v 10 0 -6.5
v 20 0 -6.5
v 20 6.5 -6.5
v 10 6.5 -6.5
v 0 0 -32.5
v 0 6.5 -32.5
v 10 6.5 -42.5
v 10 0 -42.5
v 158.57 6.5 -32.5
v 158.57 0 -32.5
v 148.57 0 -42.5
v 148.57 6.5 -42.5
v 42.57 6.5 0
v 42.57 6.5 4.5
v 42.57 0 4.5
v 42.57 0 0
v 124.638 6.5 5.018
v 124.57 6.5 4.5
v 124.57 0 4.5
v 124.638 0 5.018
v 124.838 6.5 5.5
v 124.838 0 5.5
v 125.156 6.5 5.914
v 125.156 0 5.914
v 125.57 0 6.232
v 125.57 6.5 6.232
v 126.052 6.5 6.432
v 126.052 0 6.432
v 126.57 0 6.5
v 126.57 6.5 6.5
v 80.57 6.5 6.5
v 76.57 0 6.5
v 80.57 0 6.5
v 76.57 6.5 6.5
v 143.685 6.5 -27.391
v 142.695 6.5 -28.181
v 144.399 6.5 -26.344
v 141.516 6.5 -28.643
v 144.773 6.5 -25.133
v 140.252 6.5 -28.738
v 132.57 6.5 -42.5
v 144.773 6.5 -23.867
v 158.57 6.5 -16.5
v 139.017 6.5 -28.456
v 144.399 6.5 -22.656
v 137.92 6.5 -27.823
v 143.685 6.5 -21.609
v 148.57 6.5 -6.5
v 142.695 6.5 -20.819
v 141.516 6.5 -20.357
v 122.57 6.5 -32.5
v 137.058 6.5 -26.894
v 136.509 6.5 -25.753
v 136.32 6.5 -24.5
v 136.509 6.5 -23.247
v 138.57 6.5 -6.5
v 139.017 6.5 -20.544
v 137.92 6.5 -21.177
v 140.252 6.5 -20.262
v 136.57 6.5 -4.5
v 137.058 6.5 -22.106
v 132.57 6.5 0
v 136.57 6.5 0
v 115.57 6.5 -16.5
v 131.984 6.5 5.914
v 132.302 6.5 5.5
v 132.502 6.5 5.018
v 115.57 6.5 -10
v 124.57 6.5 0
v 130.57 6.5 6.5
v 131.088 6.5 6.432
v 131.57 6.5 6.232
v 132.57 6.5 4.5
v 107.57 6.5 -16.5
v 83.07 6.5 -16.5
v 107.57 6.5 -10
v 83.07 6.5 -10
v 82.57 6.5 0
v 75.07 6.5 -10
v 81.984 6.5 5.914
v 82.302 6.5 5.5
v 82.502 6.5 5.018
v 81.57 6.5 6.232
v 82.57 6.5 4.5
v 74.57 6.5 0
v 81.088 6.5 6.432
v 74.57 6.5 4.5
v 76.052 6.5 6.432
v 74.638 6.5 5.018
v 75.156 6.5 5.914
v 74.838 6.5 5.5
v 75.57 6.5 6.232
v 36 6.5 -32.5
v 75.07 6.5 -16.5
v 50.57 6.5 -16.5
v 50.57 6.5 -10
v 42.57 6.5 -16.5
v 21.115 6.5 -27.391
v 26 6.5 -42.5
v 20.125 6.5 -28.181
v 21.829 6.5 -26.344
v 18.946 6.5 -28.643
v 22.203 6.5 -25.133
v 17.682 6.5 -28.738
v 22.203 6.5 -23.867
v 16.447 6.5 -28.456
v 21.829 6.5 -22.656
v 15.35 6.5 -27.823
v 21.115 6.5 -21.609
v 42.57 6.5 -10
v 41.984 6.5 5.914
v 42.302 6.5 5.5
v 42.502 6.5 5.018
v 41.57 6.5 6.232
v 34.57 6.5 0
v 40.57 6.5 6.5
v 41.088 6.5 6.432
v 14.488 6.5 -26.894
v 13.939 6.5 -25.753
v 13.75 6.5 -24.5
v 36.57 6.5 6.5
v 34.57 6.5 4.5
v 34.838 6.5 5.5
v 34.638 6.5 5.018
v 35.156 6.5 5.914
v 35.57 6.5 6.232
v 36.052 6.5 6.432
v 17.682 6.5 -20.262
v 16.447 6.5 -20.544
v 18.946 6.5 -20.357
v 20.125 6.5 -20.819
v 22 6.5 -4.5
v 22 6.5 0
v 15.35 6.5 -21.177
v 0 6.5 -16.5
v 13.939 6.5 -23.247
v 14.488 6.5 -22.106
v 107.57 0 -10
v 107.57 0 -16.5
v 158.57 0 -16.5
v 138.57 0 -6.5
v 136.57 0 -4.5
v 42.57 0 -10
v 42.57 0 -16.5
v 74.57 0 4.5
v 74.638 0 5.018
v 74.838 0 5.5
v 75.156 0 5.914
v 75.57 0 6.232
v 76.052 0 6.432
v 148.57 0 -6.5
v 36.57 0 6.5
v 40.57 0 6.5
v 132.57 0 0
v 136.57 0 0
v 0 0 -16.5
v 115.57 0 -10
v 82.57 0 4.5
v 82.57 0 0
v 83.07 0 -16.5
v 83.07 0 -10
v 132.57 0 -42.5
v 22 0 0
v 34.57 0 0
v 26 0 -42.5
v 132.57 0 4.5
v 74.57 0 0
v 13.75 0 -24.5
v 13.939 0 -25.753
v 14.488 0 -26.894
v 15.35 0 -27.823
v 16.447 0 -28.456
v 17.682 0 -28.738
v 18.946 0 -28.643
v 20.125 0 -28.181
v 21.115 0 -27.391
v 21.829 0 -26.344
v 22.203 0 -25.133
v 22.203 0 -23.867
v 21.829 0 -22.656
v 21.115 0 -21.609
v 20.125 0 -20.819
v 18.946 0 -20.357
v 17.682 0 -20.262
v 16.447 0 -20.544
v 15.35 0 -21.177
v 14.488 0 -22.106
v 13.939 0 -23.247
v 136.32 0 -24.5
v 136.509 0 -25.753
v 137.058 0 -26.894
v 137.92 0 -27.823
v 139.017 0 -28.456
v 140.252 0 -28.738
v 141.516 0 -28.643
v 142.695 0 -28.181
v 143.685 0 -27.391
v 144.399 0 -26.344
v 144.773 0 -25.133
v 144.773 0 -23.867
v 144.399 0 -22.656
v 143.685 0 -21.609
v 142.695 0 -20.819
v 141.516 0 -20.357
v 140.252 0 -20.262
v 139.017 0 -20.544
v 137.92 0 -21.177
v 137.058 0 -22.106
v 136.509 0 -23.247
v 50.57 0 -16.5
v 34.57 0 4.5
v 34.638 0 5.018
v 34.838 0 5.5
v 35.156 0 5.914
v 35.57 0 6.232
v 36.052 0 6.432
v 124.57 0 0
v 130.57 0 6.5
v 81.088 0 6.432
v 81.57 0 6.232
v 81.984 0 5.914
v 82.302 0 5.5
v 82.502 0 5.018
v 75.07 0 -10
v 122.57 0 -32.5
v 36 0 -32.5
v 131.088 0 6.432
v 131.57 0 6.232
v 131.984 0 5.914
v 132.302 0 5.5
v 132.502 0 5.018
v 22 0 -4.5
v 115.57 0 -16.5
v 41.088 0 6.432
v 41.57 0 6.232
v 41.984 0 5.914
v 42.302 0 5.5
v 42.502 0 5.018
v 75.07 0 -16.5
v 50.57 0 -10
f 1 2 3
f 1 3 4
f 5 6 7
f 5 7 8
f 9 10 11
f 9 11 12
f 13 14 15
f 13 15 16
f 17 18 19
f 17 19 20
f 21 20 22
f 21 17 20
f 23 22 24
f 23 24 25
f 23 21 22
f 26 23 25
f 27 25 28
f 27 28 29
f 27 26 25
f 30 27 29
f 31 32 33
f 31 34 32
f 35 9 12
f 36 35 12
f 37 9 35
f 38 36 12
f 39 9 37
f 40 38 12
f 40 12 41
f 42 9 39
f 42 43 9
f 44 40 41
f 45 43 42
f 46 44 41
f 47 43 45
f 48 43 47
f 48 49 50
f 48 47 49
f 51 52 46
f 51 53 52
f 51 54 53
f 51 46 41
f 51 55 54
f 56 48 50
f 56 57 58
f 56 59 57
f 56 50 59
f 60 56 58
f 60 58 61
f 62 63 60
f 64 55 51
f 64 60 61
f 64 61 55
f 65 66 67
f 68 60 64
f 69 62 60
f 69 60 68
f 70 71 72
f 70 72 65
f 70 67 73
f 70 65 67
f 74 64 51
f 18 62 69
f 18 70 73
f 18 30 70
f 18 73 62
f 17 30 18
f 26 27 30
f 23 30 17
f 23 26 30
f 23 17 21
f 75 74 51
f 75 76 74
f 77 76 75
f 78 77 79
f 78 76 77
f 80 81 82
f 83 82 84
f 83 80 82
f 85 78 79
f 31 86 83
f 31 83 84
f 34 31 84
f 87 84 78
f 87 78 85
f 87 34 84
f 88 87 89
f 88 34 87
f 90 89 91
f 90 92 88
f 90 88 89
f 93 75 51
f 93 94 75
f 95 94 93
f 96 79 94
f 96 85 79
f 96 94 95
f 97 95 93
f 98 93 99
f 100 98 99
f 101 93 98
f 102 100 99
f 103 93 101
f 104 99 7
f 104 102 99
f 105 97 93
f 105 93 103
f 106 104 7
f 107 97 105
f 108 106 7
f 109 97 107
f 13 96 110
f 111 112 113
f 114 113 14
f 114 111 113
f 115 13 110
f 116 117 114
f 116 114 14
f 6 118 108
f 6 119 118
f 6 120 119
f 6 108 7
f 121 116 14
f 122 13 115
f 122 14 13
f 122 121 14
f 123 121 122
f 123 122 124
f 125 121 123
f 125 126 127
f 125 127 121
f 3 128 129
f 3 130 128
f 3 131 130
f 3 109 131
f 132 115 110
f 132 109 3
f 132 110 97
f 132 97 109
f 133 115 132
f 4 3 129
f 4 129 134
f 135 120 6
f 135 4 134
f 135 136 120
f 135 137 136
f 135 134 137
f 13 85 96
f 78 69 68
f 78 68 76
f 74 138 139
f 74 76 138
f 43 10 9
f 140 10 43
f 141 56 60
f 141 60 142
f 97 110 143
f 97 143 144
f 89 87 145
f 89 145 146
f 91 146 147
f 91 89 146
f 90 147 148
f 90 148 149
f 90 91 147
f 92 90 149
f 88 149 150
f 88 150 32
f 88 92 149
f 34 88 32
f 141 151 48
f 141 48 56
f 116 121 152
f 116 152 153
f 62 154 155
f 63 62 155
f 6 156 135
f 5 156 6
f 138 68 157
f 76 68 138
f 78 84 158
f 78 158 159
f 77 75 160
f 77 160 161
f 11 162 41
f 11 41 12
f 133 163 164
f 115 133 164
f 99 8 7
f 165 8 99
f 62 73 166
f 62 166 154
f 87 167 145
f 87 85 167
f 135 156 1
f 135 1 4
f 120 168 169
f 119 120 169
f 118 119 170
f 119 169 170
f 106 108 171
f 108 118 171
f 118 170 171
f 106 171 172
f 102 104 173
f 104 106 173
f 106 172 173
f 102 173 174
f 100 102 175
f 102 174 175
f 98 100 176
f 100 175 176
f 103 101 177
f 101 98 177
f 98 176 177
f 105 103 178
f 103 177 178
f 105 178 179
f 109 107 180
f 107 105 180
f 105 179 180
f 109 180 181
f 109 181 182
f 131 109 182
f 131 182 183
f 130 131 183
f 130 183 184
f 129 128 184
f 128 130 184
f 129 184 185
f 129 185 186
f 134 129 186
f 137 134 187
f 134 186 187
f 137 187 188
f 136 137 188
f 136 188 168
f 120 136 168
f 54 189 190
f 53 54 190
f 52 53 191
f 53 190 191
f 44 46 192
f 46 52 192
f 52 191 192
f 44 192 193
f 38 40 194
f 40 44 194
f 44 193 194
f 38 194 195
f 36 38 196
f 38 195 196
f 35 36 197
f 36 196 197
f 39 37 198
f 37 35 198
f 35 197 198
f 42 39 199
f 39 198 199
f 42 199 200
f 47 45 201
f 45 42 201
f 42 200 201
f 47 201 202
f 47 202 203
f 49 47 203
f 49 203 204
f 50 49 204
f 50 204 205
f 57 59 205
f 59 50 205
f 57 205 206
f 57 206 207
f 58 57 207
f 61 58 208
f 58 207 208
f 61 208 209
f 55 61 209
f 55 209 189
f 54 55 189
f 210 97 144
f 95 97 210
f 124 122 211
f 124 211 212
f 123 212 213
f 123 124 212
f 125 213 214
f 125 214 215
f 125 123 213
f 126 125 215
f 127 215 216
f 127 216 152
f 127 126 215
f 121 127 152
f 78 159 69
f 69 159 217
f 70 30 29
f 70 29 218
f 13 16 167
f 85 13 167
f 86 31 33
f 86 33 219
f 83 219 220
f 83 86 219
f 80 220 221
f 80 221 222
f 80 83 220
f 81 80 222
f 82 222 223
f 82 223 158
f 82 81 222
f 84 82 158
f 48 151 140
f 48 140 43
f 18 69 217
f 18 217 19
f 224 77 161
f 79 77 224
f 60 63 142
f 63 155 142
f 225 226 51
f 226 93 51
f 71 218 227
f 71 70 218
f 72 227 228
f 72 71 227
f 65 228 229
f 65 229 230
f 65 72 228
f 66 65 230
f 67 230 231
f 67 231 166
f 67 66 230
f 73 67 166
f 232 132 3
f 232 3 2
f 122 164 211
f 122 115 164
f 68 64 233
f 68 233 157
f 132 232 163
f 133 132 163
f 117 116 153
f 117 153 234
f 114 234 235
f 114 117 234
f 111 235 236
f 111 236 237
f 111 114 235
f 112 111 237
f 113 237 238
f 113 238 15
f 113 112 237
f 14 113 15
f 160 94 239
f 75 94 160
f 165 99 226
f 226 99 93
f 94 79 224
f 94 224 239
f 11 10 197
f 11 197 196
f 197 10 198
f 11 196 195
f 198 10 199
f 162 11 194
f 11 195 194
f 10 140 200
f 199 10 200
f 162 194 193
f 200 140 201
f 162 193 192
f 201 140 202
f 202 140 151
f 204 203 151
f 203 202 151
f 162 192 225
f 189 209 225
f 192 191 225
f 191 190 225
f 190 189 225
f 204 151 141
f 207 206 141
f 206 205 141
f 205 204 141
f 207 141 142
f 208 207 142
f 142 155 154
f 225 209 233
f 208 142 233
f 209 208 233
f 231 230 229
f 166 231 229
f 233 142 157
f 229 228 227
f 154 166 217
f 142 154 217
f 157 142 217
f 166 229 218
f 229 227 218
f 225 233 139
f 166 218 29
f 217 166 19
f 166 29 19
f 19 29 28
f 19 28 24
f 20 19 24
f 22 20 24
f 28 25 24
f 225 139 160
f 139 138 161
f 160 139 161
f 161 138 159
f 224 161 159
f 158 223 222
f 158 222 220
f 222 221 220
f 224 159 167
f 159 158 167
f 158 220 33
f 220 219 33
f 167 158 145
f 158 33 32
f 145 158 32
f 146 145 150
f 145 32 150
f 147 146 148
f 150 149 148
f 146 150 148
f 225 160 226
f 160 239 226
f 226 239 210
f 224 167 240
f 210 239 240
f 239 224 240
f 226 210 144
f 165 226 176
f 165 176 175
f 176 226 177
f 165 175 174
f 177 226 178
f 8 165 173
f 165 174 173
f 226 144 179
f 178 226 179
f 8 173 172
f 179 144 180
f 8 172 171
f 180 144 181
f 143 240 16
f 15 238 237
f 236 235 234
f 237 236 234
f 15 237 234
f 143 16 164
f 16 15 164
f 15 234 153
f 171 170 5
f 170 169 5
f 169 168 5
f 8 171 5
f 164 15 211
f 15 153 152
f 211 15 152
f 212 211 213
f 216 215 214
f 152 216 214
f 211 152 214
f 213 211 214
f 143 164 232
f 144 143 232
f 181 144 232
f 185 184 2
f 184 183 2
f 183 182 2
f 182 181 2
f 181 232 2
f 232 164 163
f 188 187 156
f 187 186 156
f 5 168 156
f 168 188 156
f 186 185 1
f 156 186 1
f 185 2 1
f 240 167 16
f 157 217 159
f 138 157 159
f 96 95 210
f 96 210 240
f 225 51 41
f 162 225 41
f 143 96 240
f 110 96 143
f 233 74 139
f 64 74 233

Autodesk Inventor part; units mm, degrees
ref_plane "YZ Plane" through (0, 0, 0) normal (1, 0, 0) x (0, 1, 0)
ref_plane "XZ Plane" through (0, 0, 0) normal (0, 1, 0) x (-1, 0, 0)
ref_plane "XY Plane" through (0, 0, 0) normal (0, 0, 1) x (1, 0, 0)
sketch "Sketch1" plane through (0, 0, 0) normal (0, 1, 0) x (-1, 0, 0)
  circle A0 centre (-18, -24.5) radius 13 construction
  circle A1 centre (-140.57, -24.5) radius 13 construction
  circle A2 centre (-4.1, -24.5) radius 0.9 construction
  circle A3 centre (-154.47, -24.5) radius 0.9 construction
  line L0 (0, -42.5) -> (-158.57, -42.5)
  line L1 (-158.57, -42.5) -> (-158.57, -6.5)
  line L2 (0, -6.5) -> (0, -42.5)
  line L3 (-22, -6.5) -> (-22, 0)
  line L4 (-22, 0) -> (-136.57, 0)
  line L5 (-136.57, 0) -> (-136.57, -6.5)
  line L6 (-158.57, -6.5) -> (-136.57, -6.5)
  line L7 (-22, -6.5) -> (0, -6.5)
  circle A4 centre (-18, -24.5) radius 17 construction
  circle A5 centre (-18, -24.5) radius 4.25
  circle A6 centre (-140.57, -24.5) radius 4.25
  point P0 (0, 0)
  point P1 (0, -24.5)
  dimension "d0" = 26
  dimension "d1" = 1.8
  dimension "d3" = 150.37
  dimension "d4" = 36
  dimension "d5" = 18
  dimension "d6" = 18
  dimension "d7" = 6.5
  dimension "d8" = 34
  dimension "d9" = 22
  dimension "d10" = 22
  dimension "d11" = 8.5
extrude "Extrusion1" add sketch "Sketch1" along normal blind 6.5
chamfer "Chamfer1" distance 10 angle 45 4 edges at (0, 3.25, -42.5) (0, 3.25, -6.5) (158.57, 3.25, -6.5) (158.57, 3.25, -42.5)
sketch "Sketch2" plane through (0, 6.5, 0) normal (0, 1, 0) x (1, 0, 0)
  line L0 (148.57, 42.5) -> (10, 42.5) projected
  line L1 (158.57, 16.5) -> (148.57, 6.5) projected
  line L2 (158.57, 16.5) -> (158.57, 32.5) projected
  line L3 (26, 42.5) -> (36, 32.5)
  line L4 (36, 32.5) -> (122.57, 32.5)
  line L5 (122.57, 32.5) -> (132.57, 42.5)
  line L6 (26, 42.5) -> (132.57, 42.5)
  point P0 (0, 32.5)
  point P1 (0, 16.5)
  point P2 (0, 0)
  dimension "d17" = 10
  dimension "d18" = 16
  dimension "d19" = 16
  dimension "d20" = 16
extrude "Extrusion2" cut sketch "Sketch2" against normal through all
sketch "Sketch3" plane through (0, 6.5, 0) normal (0, 1, 0) x (1, 0, 0)
  line L0 (22, 0) -> (136.57, 0) projected
  circle A0 centre (140.57, 24.5) radius 4.25 projected
  circle A1 centre (18, 24.5) radius 4.25 projected
  line L1 (36.57, 16.5) -> (121.57, 16.5) construction
  line L2 (121.57, 16.5) -> (121.57, 10) construction
  line L3 (121.57, 10) -> (36.57, 10) construction
  line L4 (36.57, 10) -> (36.57, 16.5) construction
  circle A2 centre (18, 24.5) radius 17 construction
  circle A3 centre (140.57, 24.5) radius 17 construction
  line L5 (42.57, 16.5) -> (50.57, 16.5)
  line L6 (50.57, 16.5) -> (50.57, 10)
  line L7 (50.57, 10) -> (42.57, 10)
  line L8 (42.57, 10) -> (42.57, 16.5)
  line L9 (75.07, 16.5) -> (83.07, 16.5)
  line L10 (83.07, 16.5) -> (83.07, 10)
  line L11 (83.07, 10) -> (75.07, 10)
  line L12 (75.07, 10) -> (75.07, 16.5)
  line L13 (107.57, 16.5) -> (115.57, 16.5)
  line L14 (115.57, 16.5) -> (115.57, 10)
  line L15 (115.57, 10) -> (107.57, 10)
  line L16 (107.57, 10) -> (107.57, 16.5)
  line L17 (50.57, 13.25) -> (75.07, 13.25) construction
  line L18 (83.07, 13.25) -> (107.57, 13.25) construction
  point P0 (0, 0)
  dimension "d23" = 6.5
  dimension "d24" = 85
  dimension "d25" = 34
  dimension "d26" = 34
  dimension "d27" = 19
  dimension "d28" = 10
  dimension "d29" = 8
  dimension "d30" = 6
  dimension "d31" = 6
extrude "Extrusion3" cut sketch "Sketch3" against normal through all contours L5 L6 L7 L8 | L9 L10 L11 L12 | L13 L14 L15 L16
chamfer "Chamfer2" distance 2 angle 45 2 edges at (22, 3.25, -6.5) (136.57, 3.25, -6.5)
sketch "Sketch4" plane through (0, 6.5, 0) normal (0, 1, 0) x (1, 0, 0)
  line L0 (22, 0) -> (136.57, 0) projected
  line L1 (136.57, 0) -> (136.57, 4.5) projected
  line L2 (132.57, 0) -> (124.57, 0)
  line L3 (124.57, 0) -> (124.57, -4.5)
  line L4 (126.57, -6.5) -> (130.57, -6.5)
  line L5 (132.57, -4.5) -> (132.57, 0)
  line L6 (82.57, 0) -> (74.57, 0)
  line L7 (74.57, 0) -> (74.57, -4.5)
  line L8 (76.57, -6.5) -> (80.57, -6.5)
  line L9 (82.57, -4.5) -> (82.57, 0)
  line L10 (42.57, 0) -> (34.57, 0)
  line L11 (34.57, 0) -> (34.57, -4.5)
  line L12 (36.57, -6.5) -> (40.57, -6.5)
  line L13 (42.57, -4.5) -> (42.57, 0)
  arc A0 (124.57, -4.5) -> (126.57, -6.5) centre (126.57, -4.5) ccw
  arc A1 (130.57, -6.5) -> (132.57, -4.5) centre (130.57, -4.5) ccw
  arc A2 (80.57, -6.5) -> (82.57, -4.5) centre (80.57, -4.5) ccw
  arc A3 (74.57, -4.5) -> (76.57, -6.5) centre (76.57, -4.5) ccw
  arc A4 (40.57, -6.5) -> (42.57, -4.5) centre (40.57, -4.5) ccw
  arc A5 (34.57, -4.5) -> (36.57, -6.5) centre (36.57, -4.5) ccw
  point P0 (0, 0)
  dimension "d37" = 2
  dimension "d38" = 8
  dimension "d39" = 8
  dimension "d40" = 8
  dimension "d41" = 6.5
  dimension "d42" = 4
  dimension "d43" = 42
  dimension "d44" = 82
extrude "Extrusion4" add sketch "Sketch4" against normal blind 6.5
equation "\"d5\" = 0.5 * d4"
equation "\"d6\" = d5"
equation "\"d10\" = d9"
equation "\"d19\" = d18"
equation "\"d20\" = d19"
equation "\"d31\" = d30"
equation "\"d39\" = d38"
equation "\"d40\" = d39"
properties part number "z_pulley_holder_right" material "Plywood, Finish"
